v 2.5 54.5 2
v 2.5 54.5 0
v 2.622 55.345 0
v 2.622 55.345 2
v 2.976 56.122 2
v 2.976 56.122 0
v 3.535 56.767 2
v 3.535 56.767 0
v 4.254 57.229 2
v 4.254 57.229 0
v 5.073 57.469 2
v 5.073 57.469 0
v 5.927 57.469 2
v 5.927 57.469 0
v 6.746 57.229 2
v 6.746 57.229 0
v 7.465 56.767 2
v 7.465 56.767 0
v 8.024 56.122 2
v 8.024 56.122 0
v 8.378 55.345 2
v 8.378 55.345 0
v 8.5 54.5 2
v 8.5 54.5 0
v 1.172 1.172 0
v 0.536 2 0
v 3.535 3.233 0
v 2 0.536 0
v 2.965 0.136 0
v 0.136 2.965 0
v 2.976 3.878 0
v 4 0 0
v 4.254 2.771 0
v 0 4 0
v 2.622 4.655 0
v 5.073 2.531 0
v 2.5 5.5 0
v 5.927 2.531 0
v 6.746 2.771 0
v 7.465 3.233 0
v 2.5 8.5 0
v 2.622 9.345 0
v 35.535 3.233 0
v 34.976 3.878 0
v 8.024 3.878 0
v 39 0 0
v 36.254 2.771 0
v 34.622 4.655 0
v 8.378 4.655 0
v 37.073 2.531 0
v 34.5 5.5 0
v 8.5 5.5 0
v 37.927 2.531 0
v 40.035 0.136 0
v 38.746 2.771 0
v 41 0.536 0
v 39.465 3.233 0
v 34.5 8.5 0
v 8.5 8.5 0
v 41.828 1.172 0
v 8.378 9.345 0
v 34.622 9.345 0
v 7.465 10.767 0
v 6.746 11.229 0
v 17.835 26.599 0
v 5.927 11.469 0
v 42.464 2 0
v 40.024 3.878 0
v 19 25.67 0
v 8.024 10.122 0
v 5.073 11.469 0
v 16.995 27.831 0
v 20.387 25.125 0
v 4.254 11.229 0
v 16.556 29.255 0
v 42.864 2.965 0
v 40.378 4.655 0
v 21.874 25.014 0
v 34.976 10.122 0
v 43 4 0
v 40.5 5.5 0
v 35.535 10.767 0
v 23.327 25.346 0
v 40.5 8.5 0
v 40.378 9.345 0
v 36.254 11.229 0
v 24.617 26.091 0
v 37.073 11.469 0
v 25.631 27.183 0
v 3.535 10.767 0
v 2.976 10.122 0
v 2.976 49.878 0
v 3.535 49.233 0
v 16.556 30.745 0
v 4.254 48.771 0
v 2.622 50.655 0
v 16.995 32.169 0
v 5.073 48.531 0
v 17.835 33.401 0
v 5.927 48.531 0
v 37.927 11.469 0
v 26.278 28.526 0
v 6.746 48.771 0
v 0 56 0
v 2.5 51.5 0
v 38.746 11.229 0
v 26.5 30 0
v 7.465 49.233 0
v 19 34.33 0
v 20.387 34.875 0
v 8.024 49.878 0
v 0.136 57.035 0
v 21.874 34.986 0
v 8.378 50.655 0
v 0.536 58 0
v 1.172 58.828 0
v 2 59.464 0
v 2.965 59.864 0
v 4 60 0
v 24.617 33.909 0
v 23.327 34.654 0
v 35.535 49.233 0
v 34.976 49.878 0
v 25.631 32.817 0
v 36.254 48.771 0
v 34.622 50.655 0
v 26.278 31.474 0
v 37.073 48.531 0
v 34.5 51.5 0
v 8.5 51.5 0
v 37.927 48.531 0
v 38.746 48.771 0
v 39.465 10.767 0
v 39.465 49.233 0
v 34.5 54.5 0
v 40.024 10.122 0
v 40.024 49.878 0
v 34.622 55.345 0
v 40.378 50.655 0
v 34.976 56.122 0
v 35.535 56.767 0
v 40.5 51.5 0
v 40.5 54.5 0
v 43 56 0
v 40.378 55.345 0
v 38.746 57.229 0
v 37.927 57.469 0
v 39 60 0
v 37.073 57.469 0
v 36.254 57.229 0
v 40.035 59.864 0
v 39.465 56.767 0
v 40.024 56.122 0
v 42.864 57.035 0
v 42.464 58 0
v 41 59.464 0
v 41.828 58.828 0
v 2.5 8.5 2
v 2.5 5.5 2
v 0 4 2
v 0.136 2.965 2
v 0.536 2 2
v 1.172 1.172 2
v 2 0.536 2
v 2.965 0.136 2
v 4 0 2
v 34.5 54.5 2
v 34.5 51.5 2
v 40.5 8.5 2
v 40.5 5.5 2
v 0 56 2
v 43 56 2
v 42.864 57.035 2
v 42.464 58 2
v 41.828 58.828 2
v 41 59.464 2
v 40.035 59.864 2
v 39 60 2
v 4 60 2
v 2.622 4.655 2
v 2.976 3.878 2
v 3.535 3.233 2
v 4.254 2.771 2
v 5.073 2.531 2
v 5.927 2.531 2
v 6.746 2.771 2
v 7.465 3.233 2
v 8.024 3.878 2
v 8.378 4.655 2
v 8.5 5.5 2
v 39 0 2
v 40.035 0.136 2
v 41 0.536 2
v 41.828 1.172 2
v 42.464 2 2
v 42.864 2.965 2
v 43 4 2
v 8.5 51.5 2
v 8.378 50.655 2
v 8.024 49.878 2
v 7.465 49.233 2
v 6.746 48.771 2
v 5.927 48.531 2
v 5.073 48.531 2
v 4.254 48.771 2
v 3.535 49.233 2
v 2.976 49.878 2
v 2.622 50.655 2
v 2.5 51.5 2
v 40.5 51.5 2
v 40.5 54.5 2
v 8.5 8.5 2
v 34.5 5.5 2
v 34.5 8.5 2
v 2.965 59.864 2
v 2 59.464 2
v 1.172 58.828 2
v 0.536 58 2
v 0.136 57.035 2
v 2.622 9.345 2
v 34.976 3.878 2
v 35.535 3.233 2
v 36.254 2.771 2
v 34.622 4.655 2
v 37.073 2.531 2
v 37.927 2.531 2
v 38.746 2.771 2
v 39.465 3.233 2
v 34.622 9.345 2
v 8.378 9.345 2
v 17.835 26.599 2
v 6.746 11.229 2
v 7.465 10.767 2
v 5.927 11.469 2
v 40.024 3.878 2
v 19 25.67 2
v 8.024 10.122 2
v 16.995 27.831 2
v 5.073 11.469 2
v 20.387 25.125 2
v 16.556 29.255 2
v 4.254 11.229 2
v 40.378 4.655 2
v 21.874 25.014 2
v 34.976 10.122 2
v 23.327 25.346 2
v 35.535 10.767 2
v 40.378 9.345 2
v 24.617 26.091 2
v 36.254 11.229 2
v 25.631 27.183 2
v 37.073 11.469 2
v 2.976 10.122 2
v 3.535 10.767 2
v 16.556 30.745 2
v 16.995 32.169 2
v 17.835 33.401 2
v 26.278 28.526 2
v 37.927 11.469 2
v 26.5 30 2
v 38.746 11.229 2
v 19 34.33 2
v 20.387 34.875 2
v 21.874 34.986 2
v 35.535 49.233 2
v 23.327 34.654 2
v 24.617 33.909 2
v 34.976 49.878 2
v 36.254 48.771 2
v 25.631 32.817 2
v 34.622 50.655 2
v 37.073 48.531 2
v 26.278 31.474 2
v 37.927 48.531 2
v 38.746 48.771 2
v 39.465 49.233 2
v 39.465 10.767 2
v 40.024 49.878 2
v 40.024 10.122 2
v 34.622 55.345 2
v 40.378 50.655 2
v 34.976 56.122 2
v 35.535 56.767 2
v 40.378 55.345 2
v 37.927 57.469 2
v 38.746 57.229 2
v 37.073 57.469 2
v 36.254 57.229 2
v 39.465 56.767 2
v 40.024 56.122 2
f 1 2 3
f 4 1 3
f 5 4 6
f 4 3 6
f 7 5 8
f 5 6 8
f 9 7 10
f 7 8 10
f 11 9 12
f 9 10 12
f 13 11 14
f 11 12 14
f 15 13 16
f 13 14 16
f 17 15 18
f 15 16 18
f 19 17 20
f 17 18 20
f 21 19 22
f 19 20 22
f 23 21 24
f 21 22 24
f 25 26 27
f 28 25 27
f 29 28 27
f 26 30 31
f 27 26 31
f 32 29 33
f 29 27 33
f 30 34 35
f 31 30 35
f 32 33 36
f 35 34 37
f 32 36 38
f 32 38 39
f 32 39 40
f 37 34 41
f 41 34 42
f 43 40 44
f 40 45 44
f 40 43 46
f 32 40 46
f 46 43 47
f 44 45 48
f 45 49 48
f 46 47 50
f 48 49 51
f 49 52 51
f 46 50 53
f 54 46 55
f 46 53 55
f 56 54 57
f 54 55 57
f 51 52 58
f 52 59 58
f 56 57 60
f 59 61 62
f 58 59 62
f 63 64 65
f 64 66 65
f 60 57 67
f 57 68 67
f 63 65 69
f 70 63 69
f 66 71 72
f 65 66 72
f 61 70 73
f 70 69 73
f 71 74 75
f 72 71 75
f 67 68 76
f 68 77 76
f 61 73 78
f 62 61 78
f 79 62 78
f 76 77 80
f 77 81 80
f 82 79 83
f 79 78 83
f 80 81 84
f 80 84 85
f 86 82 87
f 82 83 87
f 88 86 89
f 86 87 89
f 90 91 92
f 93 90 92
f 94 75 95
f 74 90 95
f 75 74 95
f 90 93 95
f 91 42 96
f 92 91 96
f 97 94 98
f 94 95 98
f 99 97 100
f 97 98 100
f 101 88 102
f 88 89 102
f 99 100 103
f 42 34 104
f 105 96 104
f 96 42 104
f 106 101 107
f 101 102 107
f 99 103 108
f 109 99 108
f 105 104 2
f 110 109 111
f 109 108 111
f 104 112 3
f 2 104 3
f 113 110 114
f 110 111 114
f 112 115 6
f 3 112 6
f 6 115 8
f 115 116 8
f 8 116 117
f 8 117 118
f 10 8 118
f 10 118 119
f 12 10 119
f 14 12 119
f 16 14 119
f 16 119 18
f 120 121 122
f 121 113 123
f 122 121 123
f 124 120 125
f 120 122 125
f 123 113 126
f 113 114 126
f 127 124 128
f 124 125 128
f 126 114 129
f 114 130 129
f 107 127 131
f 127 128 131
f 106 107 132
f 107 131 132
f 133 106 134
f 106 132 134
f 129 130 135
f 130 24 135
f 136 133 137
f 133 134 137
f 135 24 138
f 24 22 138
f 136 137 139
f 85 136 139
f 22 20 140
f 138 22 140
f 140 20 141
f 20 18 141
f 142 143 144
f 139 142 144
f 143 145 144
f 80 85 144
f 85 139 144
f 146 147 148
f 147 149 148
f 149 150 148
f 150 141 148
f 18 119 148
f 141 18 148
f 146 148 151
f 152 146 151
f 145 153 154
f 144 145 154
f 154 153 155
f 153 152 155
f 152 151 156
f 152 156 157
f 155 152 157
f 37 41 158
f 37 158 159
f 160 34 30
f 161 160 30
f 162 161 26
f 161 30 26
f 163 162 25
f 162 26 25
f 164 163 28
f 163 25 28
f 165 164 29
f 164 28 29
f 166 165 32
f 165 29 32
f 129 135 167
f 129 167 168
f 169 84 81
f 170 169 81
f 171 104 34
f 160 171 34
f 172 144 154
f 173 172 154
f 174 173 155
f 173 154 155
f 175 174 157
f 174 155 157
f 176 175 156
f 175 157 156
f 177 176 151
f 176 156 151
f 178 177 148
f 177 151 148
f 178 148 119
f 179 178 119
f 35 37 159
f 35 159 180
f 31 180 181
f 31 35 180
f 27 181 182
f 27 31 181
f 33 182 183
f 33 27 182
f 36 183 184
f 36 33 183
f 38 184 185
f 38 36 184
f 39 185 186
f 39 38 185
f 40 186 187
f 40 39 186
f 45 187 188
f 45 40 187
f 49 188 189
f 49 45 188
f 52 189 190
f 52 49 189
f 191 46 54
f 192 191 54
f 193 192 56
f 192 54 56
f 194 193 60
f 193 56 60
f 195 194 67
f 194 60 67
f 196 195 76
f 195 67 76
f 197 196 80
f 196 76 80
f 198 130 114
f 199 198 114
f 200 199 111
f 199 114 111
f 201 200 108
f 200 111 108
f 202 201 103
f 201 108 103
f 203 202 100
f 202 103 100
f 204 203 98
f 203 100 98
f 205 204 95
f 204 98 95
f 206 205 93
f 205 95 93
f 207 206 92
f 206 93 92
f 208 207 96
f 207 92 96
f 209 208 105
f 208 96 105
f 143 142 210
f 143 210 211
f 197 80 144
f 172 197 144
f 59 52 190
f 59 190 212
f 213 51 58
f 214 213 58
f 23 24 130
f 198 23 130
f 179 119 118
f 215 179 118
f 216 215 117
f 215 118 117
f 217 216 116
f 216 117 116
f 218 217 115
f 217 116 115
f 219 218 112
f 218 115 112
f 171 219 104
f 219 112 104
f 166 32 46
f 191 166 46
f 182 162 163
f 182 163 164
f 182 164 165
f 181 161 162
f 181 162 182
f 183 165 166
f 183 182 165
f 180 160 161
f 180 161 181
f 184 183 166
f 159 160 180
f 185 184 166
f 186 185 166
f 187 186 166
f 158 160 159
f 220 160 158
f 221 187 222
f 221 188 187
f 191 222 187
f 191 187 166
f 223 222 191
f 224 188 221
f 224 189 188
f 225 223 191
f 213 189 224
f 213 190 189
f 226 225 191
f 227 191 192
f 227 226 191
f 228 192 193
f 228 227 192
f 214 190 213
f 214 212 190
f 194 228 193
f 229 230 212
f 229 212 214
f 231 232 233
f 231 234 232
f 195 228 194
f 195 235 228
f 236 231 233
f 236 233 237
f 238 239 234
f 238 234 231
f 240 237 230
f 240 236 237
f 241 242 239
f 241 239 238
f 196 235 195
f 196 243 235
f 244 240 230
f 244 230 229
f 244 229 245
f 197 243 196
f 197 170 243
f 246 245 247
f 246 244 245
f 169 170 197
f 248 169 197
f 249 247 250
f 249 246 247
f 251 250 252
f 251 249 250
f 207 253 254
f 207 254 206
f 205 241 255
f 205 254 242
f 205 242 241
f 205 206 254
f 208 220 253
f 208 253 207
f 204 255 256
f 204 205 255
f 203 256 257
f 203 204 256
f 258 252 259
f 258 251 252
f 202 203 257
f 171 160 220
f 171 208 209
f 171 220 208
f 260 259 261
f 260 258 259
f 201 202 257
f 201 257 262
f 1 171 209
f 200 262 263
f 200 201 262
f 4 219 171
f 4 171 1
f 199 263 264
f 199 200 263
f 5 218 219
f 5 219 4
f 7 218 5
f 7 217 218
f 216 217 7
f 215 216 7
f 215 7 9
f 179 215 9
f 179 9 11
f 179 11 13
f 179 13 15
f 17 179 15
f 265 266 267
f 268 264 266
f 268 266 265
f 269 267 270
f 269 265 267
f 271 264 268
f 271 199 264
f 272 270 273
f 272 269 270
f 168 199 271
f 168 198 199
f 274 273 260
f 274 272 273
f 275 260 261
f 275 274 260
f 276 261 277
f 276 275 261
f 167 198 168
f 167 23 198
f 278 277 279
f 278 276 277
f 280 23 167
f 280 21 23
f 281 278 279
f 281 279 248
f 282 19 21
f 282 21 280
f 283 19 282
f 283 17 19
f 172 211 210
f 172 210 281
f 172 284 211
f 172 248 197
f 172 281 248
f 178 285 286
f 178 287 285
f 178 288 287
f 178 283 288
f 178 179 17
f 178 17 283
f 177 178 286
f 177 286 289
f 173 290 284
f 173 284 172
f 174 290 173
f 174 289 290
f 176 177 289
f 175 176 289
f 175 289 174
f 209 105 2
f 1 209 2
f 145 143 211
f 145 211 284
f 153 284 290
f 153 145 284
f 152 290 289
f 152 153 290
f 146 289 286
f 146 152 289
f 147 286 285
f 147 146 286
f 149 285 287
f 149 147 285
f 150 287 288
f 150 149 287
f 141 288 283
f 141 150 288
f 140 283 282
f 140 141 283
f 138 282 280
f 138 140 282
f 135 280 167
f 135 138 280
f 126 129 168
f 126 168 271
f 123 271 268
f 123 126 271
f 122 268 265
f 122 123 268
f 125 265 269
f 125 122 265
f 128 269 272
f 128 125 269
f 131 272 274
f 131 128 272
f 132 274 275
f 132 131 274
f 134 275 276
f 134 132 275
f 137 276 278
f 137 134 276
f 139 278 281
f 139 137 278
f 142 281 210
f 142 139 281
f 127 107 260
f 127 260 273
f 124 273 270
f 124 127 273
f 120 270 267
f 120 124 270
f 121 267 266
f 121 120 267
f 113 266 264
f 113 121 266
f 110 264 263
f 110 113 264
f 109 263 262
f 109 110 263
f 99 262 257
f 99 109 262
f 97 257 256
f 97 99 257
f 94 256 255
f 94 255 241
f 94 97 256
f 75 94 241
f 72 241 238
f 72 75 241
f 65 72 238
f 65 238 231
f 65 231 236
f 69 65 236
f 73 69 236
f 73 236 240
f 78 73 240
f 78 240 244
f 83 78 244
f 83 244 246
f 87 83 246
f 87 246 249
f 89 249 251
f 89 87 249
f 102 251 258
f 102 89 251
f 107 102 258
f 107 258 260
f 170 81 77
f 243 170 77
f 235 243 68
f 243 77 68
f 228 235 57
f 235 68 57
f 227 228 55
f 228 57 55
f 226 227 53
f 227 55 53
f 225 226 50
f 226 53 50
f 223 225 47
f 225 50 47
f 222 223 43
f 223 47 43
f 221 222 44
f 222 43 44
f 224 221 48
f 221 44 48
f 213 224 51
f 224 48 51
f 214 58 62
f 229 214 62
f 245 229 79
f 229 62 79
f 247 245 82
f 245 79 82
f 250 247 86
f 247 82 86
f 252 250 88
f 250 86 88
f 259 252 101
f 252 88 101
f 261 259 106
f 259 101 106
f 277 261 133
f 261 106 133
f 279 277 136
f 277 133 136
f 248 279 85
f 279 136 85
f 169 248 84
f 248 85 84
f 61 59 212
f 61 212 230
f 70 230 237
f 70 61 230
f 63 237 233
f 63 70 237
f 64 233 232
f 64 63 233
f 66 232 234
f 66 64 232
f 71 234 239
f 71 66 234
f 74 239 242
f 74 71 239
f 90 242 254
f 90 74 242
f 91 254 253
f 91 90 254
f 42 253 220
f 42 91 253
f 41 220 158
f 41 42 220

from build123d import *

# Parameters (mm, degrees)
SKETCH1_R           = 5
BOSS_EXTRUDE1_DEPTH = 2


with BuildPart() as part:
    # Sketch1 → Boss-Extrude1 (new body)
    with BuildSketch(Plane.XY):
        with BuildLine():
            Line((4, 0), (39, 0))
            ThreePointArc((39, 0), (41.828427125, 1.171572875), (43, 4))
            Line((43, 4), (43, 56))
            ThreePointArc((43, 56), (41.828427125, 58.828427125), (39, 60))
            Line((39, 60), (4, 60))
            ThreePointArc((4, 60), (1.171572875, 58.828427125), (0, 56))
            Line((0, 56), (0, 4))
            ThreePointArc((0, 4), (1.171572875, 1.171572875), (4, 0))
        make_face()
        with Locations((21.5, 30)):
            Circle(SKETCH1_R, mode=Mode.SUBTRACT)
        with BuildLine():
            Line((40.5, 8.5), (40.5, 5.5))
            ThreePointArc((40.5, 5.5), (37.5, 2.5), (34.5, 5.5))
            Line((34.5, 5.5), (34.5, 8.5))
            ThreePointArc((34.5, 8.5), (37.5, 11.5), (40.5, 8.5))
        make_face(mode=Mode.SUBTRACT)
        with BuildLine():
            Line((40.5, 51.5), (40.5, 54.5))
            ThreePointArc((40.5, 54.5), (37.5, 57.5), (34.5, 54.5))
            Line((34.5, 54.5), (34.5, 51.5))
            ThreePointArc((34.5, 51.5), (37.5, 48.5), (40.5, 51.5))
        make_face(mode=Mode.SUBTRACT)
        with BuildLine():
            Line((2.5, 8.5), (2.5, 5.5))
            ThreePointArc((2.5, 5.5), (5.5, 2.5), (8.5, 5.5))
            Line((8.5, 5.5), (8.5, 8.5))
            ThreePointArc((8.5, 8.5), (5.5, 11.5), (2.5, 8.5))
        make_face(mode=Mode.SUBTRACT)
        with BuildLine():
            Line((2.5, 51.5), (2.5, 54.5))
            ThreePointArc((2.5, 54.5), (5.5, 57.5), (8.5, 54.5))
            Line((8.5, 54.5), (8.5, 51.5))
            ThreePointArc((8.5, 51.5), (5.5, 48.5), (2.5, 51.5))
        make_face(mode=Mode.SUBTRACT)
    extrude(amount=BOSS_EXTRUDE1_DEPTH)


solid = part.part
